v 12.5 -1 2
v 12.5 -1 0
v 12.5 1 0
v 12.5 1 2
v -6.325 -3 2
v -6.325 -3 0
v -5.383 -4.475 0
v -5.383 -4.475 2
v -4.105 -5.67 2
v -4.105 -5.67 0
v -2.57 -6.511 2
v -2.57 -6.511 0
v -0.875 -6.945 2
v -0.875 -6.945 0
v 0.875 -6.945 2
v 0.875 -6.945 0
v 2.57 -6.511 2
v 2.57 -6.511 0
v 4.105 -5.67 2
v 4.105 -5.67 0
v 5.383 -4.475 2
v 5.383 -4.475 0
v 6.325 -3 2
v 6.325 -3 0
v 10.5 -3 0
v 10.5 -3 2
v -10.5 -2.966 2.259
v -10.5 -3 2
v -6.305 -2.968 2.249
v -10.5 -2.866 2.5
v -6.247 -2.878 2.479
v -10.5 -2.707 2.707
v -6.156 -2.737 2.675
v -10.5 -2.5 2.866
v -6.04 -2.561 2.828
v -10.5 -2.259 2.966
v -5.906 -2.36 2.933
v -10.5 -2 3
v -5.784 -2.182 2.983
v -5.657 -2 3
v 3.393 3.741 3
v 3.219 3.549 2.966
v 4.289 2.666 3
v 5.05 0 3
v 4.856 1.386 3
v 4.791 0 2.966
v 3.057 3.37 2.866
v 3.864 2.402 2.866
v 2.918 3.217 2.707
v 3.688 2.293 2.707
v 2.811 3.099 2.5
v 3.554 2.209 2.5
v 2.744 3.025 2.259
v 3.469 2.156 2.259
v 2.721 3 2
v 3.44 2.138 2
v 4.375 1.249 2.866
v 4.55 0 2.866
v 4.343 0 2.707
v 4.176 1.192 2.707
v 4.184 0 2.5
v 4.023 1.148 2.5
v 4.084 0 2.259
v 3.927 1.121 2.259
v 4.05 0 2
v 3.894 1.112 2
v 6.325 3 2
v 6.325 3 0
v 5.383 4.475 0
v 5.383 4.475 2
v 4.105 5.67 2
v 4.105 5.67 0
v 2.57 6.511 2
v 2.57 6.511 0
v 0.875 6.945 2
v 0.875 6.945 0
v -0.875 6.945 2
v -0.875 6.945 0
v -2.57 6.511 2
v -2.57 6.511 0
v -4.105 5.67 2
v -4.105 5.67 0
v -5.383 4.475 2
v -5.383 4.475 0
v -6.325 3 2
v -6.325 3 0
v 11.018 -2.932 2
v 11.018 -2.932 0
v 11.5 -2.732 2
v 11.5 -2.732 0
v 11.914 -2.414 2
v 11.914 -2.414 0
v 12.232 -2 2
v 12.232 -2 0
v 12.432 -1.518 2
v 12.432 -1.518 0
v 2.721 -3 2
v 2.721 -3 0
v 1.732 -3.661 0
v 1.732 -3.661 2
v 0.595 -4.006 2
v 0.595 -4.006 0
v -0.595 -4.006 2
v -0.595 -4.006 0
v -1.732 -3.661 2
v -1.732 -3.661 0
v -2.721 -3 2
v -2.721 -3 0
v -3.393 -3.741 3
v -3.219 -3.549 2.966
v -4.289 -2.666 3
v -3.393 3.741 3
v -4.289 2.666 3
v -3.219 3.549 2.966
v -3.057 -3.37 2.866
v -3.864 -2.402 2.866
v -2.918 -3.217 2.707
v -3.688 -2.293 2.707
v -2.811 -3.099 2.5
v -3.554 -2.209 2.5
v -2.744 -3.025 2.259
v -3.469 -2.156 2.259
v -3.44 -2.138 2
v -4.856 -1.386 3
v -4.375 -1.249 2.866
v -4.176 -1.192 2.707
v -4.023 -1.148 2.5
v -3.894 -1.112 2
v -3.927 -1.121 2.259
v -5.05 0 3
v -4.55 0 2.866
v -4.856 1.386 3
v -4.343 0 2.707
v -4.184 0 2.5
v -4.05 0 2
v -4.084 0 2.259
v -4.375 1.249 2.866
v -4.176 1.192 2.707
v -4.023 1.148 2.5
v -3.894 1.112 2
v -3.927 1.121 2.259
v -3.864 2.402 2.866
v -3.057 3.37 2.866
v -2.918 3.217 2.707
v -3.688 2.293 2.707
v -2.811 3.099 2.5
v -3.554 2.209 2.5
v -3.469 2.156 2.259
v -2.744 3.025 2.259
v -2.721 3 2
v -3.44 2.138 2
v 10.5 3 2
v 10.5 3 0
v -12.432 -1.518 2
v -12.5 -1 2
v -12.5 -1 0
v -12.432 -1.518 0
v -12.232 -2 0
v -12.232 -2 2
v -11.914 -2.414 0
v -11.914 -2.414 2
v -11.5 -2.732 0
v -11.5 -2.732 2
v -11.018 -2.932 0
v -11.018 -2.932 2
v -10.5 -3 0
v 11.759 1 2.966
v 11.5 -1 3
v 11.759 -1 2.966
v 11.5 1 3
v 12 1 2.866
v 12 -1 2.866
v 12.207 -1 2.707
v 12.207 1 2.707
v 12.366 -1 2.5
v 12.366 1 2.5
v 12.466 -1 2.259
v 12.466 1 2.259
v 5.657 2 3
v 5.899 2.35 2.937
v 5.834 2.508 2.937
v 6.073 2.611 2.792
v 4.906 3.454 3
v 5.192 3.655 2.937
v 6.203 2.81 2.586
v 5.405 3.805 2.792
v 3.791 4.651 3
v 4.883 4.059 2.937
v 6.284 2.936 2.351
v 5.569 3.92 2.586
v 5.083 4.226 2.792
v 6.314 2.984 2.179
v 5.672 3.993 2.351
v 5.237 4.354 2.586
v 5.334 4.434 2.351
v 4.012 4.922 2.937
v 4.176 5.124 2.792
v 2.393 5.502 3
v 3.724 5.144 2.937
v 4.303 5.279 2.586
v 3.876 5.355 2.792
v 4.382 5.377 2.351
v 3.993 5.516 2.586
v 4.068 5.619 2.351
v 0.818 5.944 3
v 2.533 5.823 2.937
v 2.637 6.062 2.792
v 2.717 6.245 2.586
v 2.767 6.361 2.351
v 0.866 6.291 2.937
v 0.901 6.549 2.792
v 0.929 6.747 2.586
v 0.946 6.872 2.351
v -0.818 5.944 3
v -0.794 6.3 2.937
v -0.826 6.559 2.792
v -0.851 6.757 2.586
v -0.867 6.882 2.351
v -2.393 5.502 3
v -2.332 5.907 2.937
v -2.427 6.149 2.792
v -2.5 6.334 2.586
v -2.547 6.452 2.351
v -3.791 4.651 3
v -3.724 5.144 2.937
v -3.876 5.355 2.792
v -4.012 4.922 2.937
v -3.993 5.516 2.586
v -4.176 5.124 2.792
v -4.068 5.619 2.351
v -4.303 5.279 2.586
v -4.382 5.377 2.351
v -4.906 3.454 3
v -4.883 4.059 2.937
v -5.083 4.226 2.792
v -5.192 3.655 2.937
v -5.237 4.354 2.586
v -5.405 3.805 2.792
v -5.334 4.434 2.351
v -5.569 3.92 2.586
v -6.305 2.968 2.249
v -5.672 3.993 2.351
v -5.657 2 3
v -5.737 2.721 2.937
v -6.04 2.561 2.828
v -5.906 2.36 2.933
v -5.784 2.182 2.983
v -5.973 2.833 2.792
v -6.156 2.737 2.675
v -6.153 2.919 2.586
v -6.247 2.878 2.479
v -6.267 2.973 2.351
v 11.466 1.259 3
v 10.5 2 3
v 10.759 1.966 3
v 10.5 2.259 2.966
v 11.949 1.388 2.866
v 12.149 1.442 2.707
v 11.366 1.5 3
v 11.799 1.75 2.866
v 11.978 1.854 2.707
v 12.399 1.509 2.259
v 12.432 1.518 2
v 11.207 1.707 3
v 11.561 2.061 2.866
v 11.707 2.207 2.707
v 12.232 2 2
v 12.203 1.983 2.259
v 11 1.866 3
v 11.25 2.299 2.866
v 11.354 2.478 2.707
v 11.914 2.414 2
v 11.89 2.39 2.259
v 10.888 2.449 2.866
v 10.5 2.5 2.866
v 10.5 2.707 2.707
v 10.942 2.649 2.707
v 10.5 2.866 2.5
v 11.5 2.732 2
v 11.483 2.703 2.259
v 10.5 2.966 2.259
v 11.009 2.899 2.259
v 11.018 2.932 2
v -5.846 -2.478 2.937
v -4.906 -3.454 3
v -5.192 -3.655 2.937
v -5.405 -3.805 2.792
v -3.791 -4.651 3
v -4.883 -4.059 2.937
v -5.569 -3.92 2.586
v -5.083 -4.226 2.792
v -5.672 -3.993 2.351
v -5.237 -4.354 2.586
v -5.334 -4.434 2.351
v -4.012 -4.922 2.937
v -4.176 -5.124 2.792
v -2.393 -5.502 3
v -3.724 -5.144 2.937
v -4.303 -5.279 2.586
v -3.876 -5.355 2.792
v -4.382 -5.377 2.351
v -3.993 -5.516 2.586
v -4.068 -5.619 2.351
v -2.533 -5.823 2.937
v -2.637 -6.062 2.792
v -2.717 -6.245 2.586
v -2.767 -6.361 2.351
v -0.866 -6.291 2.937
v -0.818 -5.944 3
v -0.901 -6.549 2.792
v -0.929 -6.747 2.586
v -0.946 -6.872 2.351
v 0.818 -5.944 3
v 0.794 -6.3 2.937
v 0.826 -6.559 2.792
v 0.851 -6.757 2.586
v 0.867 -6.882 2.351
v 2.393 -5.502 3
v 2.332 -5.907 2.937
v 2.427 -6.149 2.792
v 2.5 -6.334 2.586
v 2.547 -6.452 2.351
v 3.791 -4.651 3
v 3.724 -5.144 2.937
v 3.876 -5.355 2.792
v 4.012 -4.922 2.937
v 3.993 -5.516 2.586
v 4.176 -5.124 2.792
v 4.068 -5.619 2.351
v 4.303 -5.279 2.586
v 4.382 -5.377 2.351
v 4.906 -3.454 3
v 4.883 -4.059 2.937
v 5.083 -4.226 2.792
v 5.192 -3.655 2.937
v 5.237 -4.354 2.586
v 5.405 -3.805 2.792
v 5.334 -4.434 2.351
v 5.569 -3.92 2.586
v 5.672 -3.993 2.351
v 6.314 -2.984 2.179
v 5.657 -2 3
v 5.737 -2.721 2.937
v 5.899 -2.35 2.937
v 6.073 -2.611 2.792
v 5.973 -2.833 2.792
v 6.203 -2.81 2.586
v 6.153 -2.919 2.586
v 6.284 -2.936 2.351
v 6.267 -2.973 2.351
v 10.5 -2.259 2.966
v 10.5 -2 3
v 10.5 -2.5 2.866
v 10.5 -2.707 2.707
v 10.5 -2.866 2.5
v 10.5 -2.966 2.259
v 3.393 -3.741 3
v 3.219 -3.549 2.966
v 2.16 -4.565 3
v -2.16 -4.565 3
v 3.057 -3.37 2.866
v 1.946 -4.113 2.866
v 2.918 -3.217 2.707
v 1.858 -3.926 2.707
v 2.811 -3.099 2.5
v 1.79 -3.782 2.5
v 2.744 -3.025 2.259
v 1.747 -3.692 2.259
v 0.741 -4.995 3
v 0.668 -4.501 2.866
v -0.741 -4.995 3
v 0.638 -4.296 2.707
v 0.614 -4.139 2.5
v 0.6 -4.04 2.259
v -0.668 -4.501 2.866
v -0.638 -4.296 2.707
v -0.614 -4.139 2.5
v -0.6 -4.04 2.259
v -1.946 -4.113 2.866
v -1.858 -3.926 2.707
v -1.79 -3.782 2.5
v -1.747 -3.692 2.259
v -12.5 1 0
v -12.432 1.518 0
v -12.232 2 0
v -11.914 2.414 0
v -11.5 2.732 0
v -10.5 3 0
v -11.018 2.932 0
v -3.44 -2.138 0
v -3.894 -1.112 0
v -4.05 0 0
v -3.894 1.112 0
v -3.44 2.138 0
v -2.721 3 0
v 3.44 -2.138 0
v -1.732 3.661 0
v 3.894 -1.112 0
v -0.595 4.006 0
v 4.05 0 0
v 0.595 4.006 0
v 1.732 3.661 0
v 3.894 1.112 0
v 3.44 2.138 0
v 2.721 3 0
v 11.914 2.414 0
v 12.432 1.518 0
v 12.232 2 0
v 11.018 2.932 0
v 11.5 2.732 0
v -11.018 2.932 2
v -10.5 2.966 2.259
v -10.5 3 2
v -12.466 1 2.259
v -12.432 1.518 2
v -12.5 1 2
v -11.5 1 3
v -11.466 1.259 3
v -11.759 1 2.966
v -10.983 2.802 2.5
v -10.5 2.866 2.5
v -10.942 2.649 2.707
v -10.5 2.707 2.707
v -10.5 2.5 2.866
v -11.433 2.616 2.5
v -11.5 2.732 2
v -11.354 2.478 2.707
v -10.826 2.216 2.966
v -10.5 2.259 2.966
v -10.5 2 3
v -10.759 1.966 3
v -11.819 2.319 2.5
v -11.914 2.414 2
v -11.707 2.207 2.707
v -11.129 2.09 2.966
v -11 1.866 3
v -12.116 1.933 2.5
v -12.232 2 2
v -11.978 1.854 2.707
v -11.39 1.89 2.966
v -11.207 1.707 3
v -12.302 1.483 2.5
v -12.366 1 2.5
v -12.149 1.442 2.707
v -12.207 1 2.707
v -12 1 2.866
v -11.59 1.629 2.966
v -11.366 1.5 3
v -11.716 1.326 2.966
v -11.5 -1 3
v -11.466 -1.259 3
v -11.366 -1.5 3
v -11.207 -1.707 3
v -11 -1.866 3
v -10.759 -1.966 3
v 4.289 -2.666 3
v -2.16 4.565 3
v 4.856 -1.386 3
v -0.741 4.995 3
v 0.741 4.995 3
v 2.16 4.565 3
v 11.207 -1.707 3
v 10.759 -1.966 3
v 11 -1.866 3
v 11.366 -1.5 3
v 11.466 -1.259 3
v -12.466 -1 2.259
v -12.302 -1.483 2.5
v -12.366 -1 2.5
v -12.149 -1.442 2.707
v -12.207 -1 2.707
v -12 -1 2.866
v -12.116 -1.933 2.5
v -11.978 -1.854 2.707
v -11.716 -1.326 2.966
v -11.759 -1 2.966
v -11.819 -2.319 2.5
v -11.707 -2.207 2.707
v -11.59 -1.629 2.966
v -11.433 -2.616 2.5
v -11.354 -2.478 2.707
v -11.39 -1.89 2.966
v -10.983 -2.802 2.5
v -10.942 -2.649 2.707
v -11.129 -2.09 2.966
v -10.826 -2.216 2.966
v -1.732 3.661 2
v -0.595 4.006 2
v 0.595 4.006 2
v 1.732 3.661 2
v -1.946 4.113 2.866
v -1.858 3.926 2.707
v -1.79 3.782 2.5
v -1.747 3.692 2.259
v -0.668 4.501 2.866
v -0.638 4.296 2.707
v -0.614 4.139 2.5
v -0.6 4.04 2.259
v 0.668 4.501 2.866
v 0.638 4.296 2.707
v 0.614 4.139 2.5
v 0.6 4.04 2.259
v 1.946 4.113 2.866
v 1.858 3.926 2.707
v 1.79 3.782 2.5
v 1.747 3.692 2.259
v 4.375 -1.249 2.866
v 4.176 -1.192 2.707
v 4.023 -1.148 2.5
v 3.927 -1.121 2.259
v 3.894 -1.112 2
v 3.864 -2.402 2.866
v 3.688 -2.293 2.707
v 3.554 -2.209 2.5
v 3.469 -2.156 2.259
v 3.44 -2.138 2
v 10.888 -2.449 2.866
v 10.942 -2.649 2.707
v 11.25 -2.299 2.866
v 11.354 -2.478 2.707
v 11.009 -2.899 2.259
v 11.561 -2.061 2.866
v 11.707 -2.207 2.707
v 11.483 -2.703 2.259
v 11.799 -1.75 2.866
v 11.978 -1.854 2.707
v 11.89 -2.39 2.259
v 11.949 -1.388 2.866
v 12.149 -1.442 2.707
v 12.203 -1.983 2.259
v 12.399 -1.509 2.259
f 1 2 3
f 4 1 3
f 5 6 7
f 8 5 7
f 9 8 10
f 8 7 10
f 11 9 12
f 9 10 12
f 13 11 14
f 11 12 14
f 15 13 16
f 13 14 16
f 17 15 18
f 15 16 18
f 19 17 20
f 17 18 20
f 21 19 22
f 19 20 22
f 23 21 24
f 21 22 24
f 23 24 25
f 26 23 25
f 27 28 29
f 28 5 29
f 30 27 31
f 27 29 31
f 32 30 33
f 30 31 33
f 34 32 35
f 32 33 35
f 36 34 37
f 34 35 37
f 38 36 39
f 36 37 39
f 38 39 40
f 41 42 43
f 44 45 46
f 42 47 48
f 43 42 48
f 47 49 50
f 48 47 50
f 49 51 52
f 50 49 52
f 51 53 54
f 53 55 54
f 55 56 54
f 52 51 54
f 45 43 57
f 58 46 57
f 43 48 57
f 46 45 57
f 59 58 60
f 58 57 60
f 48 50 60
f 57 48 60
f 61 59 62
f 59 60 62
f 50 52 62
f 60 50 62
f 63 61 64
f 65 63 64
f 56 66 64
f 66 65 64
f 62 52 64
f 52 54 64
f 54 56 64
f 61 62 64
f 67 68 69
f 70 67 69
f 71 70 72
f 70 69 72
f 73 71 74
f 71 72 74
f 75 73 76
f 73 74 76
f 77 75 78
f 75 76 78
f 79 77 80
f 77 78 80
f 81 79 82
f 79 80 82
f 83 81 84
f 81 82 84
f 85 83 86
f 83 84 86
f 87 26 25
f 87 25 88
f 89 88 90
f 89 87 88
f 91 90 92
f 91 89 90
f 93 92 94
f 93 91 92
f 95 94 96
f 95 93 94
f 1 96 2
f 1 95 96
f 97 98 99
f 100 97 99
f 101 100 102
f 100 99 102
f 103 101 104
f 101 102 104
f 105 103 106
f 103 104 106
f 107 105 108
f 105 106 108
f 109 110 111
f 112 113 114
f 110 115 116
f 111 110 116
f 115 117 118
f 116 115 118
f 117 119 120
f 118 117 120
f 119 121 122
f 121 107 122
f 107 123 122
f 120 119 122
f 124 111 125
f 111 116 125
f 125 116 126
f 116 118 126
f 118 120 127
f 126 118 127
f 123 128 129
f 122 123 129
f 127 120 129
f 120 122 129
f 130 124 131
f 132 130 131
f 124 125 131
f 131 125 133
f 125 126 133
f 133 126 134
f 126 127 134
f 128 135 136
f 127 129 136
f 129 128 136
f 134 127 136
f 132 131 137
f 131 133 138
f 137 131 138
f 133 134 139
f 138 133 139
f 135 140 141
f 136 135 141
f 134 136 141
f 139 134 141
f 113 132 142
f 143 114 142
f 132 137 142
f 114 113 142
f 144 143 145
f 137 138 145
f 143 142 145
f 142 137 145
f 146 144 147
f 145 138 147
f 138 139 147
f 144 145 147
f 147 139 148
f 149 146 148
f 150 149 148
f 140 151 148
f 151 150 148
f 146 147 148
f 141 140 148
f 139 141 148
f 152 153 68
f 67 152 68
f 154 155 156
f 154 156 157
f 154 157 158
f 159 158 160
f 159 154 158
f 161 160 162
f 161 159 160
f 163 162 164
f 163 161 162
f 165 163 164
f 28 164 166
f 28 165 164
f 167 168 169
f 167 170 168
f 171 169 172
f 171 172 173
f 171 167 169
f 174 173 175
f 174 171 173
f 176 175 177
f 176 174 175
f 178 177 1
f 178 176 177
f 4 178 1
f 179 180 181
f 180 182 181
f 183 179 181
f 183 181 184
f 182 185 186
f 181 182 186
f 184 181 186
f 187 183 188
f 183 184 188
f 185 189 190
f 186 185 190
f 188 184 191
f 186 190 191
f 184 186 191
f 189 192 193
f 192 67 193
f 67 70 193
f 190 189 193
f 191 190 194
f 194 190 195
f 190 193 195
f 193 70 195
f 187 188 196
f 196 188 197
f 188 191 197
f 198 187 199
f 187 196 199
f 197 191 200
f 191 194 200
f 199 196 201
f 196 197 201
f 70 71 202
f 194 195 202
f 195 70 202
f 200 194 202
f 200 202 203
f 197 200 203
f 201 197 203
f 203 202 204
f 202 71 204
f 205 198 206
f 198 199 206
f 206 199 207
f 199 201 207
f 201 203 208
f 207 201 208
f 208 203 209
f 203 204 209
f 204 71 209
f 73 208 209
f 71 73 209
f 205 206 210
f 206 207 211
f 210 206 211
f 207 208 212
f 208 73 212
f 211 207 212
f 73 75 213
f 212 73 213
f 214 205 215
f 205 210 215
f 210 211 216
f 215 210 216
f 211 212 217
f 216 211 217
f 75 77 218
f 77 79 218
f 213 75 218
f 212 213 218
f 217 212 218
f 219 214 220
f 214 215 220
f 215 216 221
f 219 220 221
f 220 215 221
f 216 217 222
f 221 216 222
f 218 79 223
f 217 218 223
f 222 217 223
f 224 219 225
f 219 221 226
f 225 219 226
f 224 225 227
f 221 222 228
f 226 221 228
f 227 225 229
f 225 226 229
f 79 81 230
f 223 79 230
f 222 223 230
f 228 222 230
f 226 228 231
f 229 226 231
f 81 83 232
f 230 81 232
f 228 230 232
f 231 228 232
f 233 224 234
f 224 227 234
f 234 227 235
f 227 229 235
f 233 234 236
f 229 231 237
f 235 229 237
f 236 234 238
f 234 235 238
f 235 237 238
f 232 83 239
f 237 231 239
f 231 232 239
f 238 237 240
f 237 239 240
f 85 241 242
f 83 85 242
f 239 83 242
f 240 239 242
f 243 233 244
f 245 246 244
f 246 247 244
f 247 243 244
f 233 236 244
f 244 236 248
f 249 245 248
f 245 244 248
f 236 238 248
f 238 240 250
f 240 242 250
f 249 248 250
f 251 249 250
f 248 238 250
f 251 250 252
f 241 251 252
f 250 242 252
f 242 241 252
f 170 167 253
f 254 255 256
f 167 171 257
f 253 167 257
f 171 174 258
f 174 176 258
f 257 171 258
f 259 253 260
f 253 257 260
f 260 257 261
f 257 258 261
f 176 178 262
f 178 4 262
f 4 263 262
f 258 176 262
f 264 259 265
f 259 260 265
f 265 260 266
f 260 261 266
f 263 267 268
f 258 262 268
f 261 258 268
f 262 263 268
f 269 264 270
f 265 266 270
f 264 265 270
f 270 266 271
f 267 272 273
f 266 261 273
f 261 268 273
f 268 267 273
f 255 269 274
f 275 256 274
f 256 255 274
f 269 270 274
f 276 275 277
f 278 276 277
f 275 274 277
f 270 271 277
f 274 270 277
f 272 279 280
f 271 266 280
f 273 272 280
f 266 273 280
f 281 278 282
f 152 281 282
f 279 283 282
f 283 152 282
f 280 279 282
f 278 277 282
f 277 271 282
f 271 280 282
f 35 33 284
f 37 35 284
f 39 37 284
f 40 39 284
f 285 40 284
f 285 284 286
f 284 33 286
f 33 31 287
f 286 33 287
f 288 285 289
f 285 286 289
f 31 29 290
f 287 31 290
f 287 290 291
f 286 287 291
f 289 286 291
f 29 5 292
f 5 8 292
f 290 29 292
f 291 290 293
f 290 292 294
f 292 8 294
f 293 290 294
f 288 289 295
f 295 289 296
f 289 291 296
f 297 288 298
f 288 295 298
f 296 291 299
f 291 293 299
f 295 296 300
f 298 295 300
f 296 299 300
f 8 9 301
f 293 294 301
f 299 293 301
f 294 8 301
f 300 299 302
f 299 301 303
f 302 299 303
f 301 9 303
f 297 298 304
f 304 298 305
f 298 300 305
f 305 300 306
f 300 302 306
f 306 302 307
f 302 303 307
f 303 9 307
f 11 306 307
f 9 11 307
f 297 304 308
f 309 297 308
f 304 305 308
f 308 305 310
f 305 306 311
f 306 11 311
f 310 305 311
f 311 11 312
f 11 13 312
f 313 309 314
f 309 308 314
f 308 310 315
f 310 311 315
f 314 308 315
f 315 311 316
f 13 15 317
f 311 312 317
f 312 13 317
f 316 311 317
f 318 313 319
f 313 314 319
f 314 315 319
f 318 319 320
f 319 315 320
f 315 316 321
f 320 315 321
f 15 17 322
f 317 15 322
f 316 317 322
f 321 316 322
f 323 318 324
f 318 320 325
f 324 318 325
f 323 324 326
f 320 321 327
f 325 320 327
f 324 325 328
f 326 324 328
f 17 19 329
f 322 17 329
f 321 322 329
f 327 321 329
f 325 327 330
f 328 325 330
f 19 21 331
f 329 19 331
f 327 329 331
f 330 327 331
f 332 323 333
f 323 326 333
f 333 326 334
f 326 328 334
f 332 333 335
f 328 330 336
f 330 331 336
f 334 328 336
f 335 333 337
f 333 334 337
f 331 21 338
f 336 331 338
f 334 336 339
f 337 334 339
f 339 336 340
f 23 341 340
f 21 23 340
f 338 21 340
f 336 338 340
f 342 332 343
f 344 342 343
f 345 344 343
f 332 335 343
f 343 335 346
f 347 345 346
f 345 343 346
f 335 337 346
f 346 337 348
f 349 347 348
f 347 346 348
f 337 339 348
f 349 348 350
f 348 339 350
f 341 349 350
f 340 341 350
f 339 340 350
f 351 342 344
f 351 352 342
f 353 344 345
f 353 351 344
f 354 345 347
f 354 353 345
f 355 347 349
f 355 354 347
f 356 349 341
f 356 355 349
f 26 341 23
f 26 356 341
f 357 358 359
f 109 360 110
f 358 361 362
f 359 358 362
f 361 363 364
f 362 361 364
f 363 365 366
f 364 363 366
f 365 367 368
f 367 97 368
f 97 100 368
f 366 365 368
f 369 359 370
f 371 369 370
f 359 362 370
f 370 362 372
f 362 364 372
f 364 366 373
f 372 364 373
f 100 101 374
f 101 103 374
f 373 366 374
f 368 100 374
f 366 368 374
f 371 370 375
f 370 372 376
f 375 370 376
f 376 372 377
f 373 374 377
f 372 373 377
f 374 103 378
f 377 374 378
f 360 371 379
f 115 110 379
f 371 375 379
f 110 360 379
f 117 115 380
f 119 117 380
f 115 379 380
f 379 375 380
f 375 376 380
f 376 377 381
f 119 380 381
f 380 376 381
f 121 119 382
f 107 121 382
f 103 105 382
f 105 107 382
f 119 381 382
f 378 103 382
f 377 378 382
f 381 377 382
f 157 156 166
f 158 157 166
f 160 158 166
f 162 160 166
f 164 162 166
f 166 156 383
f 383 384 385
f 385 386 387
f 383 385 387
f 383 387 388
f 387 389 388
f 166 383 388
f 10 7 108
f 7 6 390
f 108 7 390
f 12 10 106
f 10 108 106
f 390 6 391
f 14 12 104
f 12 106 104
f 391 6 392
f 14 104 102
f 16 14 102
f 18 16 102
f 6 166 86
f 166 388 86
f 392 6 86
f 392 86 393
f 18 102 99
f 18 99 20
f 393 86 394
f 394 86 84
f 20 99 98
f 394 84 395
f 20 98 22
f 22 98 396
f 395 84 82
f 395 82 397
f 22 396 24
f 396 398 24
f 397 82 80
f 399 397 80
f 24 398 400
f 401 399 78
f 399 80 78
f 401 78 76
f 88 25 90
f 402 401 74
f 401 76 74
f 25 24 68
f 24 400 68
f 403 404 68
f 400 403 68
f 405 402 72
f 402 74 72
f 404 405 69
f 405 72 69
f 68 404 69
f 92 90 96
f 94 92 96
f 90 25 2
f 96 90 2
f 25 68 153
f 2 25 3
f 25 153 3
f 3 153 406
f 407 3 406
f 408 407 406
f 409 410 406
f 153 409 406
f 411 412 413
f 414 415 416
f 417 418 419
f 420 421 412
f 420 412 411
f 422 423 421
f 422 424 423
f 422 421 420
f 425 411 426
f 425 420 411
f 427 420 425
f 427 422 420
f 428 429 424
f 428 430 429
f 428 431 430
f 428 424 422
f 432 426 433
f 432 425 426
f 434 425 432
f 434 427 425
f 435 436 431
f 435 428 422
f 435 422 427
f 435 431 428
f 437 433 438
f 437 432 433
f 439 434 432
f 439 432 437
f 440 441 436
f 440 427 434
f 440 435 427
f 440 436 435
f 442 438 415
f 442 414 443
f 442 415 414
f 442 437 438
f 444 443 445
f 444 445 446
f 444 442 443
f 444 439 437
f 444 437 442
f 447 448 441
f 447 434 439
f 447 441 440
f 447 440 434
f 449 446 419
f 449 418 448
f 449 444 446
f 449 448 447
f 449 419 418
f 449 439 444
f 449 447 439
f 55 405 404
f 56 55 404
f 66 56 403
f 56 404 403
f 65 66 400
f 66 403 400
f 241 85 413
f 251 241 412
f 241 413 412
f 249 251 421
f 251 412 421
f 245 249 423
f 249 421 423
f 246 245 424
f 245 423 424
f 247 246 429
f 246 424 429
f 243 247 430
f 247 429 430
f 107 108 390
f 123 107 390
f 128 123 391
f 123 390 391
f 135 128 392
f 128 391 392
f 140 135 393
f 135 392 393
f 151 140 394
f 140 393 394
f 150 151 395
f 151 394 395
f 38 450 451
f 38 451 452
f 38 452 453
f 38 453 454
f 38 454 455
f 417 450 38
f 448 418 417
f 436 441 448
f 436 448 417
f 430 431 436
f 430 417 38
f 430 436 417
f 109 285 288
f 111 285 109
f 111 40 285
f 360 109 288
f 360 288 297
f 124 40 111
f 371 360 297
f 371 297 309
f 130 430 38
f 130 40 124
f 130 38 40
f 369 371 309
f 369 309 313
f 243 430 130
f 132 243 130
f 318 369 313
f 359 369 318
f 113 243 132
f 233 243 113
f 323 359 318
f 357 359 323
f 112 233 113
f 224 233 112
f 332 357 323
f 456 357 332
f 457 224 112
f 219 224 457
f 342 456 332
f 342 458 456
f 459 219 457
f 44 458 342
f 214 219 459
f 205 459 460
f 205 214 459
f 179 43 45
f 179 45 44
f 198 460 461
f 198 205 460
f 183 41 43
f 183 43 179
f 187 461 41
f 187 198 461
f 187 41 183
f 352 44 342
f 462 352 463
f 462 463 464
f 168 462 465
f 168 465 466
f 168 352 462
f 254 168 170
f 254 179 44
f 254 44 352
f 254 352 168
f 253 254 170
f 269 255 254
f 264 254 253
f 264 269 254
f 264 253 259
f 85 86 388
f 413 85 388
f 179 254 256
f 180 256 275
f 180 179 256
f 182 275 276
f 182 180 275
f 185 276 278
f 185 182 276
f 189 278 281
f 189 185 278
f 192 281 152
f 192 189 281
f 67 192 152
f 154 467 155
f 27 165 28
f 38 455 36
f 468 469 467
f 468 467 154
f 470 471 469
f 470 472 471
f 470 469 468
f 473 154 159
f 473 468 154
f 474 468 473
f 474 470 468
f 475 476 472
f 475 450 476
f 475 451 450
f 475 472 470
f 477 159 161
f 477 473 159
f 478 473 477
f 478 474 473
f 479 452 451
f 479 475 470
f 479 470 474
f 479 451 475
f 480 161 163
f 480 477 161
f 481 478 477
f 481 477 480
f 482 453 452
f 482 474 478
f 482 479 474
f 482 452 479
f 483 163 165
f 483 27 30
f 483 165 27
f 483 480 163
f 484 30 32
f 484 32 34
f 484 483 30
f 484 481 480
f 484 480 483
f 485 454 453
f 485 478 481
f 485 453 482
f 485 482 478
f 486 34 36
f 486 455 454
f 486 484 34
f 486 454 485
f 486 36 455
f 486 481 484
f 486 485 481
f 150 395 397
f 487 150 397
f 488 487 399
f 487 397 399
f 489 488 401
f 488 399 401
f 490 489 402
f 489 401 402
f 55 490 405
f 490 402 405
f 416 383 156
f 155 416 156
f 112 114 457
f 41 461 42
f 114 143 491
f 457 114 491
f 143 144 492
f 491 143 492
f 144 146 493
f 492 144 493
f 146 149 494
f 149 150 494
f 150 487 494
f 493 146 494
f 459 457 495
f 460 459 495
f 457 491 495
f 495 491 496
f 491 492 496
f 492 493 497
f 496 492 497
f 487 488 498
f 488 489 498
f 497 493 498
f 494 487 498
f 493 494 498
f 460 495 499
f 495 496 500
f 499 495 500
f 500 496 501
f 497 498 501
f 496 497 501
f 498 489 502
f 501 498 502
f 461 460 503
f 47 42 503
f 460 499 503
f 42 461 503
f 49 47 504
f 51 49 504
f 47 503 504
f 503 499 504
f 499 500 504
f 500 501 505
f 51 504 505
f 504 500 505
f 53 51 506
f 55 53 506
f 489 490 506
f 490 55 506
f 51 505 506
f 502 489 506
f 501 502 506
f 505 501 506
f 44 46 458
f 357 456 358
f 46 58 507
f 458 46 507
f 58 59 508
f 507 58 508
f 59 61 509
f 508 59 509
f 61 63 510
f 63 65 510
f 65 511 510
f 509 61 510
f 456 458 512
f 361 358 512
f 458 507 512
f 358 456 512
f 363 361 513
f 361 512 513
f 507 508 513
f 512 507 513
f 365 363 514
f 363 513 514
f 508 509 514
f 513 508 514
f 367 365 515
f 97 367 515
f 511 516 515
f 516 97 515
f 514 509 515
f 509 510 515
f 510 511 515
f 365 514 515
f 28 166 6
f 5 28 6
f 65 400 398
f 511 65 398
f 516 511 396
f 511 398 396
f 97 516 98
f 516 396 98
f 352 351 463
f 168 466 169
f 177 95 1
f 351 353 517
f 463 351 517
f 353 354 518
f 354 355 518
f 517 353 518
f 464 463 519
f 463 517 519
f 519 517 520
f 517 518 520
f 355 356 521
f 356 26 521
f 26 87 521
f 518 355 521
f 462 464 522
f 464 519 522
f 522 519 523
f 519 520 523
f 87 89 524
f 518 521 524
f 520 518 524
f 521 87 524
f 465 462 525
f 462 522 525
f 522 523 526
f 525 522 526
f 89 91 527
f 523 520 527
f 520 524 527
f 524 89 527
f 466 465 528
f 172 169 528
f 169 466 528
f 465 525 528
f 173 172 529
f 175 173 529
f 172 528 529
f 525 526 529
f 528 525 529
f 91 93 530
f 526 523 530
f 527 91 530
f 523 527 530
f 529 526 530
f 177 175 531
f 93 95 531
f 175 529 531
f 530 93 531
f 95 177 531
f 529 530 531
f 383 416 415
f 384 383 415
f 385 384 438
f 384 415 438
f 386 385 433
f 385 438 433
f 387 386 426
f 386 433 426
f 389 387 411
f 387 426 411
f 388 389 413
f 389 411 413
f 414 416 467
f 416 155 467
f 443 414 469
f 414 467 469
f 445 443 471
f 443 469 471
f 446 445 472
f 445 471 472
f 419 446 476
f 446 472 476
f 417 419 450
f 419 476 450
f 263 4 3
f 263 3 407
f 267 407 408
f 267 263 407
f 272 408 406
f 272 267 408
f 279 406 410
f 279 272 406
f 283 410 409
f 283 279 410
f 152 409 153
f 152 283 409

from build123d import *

# Parameters (mm, degrees)
F2_DEPTH = 3
F3_R     = 2
F4_R     = 1


with BuildPart() as f2:
    # F1 (on Top) → F2 (new body)
    with BuildSketch(Plane.XY):
        with BuildLine():
            ThreePointArc((-6.3245553203, -3), (-7, 0), (-6.3245553203, 3))
            Line((-6.3245553203, 3), (-12.5, 3))
            Line((-12.5, 3), (-12.5, -3))
            Line((-12.5, -3), (-6.3245553203, -3))
        make_face()
        with BuildLine():
            Line((6.3245553203, -3), (2.7207535721, -3))
            ThreePointArc((2.7207535721, -3), (0, -4.05), (-2.7207535721, -3))
            Line((-2.7207535721, -3), (-6.3245553203, -3))
            ThreePointArc((-6.3245553203, -3), (0, -7), (6.3245553203, -3))
        make_face()
        with BuildLine():
            ThreePointArc((-2.7207535721, -3), (-4.05, 0), (-2.7207535721, 3))
            Line((-2.7207535721, 3), (-6.3245553203, 3))
            ThreePointArc((-6.3245553203, 3), (-7, 0), (-6.3245553203, -3))
            Line((-6.3245553203, -3), (-2.7207535721, -3))
        make_face()
        with BuildLine():
            ThreePointArc((-2.7207535721, 3), (0, 4.05), (2.7207535721, 3))
            Line((2.7207535721, 3), (6.3245553203, 3))
            ThreePointArc((6.3245553203, 3), (0, 7), (-6.3245553203, 3))
            Line((-6.3245553203, 3), (-2.7207535721, 3))
        make_face()
        with BuildLine():
            ThreePointArc((2.7207535721, 3), (3.7028065009, 1.6406474382), (4.05, 0))
            ThreePointArc((4.05, 0), (3.7028065009, -1.6406474382), (2.7207535721, -3))
            Line((2.7207535721, -3), (6.3245553203, -3))
            ThreePointArc((6.3245553203, -3), (6.8290514437, -1.5375488216), (7, 0))
            ThreePointArc((7, 0), (6.8290514437, 1.5375488216), (6.3245553203, 3))
            Line((6.3245553203, 3), (2.7207535721, 3))
        make_face()
        with BuildLine():
            Line((12.5, 3), (6.3245553203, 3))
            ThreePointArc((6.3245553203, 3), (6.8290514437, 1.5375488216), (7, 0))
            ThreePointArc((7, 0), (6.8290514437, -1.5375488216), (6.3245553203, -3))
            Line((6.3245553203, -3), (12.5, -3))
            Line((12.5, -3), (12.5, 3))
        make_face()
    extrude(amount=F2_DEPTH)

    # F3
    f3_edges = [f2.edges().sort_by_distance(p)[0] for p in [
        (-12.5, -3, 1.5),
        (-12.5, 3, 1.5),
        (12.5, -3, 1.5),
        (12.5, 3, 1.5),
    ]]
    fillet(f3_edges, radius=F3_R)

    # F4
    f4_edges = [f2.edges().sort_by_distance(p)[0] for p in [
        (-12.5, 0, 3),
        (-11.914214, 2.414214, 3),
        (-11.914214, -2.414214, 3),
        (-8.412278, 3, 3),
        (-8.412278, -3, 3),
        (0, 7, 3),
        (0, -7, 3),
        (8.412278, 3, 3),
        (8.412278, -3, 3),
        (11.914214, 2.414214, 3),
        (11.914214, -2.414214, 3),
        (12.5, 0, 3),
        (-2.720754, -3, 3),
    ]]
    fillet(f4_edges, radius=F4_R)


solid = f2.part
